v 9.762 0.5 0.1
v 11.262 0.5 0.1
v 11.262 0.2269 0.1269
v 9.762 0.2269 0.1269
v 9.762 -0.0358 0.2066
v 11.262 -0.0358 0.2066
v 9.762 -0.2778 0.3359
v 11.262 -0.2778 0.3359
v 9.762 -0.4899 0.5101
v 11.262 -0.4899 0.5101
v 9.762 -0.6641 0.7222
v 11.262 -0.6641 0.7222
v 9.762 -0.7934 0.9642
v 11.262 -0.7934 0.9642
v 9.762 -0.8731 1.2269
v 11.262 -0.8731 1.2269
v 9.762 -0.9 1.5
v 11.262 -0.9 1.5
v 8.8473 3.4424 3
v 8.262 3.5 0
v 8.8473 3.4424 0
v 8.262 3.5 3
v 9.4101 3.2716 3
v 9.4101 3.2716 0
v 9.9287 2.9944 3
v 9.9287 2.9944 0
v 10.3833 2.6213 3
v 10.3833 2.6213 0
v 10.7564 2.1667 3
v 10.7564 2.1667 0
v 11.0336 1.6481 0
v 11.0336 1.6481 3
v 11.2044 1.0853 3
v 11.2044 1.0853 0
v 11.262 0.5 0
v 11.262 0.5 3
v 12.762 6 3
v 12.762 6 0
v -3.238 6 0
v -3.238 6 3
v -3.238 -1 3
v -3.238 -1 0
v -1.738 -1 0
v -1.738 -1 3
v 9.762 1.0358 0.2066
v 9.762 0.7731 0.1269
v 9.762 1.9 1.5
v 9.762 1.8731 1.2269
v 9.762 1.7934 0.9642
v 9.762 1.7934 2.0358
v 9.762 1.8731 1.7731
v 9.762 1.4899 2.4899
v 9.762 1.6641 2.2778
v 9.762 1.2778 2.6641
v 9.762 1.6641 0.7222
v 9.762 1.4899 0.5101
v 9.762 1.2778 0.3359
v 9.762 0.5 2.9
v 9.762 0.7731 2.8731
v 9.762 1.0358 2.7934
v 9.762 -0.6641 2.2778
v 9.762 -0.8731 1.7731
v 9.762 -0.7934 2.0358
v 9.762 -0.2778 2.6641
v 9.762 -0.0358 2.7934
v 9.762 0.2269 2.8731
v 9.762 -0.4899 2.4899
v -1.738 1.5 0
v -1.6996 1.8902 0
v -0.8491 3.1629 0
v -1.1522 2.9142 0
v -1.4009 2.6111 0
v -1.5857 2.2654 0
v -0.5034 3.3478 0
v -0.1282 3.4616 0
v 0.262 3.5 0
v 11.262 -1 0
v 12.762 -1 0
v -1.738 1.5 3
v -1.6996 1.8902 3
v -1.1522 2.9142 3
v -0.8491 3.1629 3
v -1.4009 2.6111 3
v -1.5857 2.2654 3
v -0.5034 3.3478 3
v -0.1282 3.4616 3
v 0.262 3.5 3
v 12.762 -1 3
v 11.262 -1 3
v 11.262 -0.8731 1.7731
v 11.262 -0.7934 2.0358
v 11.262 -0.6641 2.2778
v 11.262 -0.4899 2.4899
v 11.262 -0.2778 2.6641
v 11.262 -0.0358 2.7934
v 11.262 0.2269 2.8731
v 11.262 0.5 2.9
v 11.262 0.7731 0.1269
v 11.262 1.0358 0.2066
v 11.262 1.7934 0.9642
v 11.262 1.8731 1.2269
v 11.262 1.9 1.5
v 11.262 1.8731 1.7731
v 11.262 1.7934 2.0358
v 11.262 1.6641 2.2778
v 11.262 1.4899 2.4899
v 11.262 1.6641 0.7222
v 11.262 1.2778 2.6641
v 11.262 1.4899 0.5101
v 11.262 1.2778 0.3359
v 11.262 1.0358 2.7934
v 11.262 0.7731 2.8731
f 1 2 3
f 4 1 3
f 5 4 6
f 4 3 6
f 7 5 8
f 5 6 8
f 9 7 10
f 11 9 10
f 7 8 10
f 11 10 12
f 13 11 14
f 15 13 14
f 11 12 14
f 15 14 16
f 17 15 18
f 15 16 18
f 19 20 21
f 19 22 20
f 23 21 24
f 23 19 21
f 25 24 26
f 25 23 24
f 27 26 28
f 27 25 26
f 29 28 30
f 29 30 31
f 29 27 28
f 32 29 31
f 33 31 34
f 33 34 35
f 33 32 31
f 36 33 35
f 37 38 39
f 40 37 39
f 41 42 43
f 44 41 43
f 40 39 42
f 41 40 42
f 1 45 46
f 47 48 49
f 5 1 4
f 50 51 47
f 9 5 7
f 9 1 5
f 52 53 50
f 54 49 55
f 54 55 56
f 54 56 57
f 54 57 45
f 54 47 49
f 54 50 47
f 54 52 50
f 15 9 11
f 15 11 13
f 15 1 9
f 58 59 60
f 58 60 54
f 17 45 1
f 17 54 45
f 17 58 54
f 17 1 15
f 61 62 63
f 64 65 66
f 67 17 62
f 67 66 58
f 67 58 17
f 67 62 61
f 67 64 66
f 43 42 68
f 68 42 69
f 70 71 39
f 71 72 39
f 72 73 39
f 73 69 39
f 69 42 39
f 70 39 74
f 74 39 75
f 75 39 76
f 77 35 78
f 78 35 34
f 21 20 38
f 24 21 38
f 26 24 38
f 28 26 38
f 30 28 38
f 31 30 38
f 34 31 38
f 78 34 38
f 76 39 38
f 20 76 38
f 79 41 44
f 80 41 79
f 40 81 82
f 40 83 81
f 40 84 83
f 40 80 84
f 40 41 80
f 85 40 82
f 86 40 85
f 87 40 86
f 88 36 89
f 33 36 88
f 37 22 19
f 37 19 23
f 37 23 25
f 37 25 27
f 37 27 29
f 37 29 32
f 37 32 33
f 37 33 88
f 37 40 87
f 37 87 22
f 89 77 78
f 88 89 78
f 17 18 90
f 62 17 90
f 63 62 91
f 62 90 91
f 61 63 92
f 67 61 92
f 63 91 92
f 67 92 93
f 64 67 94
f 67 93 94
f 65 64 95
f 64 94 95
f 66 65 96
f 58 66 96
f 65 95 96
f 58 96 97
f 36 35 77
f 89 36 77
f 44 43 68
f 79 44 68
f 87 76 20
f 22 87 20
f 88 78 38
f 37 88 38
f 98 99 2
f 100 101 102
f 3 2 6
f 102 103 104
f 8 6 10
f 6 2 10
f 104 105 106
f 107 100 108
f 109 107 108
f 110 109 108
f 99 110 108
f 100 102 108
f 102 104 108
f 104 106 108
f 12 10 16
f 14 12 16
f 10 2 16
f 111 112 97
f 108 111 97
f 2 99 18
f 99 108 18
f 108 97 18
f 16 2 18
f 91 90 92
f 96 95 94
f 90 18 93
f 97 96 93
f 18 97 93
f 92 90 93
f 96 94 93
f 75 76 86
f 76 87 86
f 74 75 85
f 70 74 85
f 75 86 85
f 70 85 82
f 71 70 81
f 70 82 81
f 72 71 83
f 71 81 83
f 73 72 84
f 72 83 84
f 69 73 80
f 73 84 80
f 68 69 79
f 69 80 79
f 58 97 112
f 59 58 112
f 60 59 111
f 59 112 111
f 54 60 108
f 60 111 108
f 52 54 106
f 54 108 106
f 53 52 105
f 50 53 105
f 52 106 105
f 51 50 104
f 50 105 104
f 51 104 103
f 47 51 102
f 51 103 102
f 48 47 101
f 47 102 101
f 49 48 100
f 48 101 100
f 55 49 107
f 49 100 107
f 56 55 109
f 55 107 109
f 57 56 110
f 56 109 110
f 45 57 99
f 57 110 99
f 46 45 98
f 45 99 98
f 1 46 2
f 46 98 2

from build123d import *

# Parameters (mm, degrees)
F1_DEPTH = 3
F2_R     = 3
F3_R     = 2
F5_DEPTH = 1.5


with BuildPart() as f1:
    # F0 (on Top) → F1 (new body)
    with BuildSketch(Plane.XY):
        Polygon((-3.2379887671, -1), (-1.7379887671, -1), (-1.7379887671, 3.5), (11.2620112329, 3.5), (11.2620112329, -1), (12.7620112329, -1), (12.7620112329, 6), (-3.2379887671, 6), align=None)
    extrude(amount=F1_DEPTH)

    # F2
    f2_edges = [f1.edges().sort_by_distance(p)[0] for p in [
        (11.262011, 3.5, 1.5),
    ]]
    fillet(f2_edges, radius=F2_R)

    # F3
    f3_edges = [f1.edges().sort_by_distance(p)[0] for p in [
        (-1.737989, 3.5, 1.5),
    ]]
    fillet(f3_edges, radius=F3_R)


with BuildPart() as f5:
    # F4 (on face) → F5 (new body)
    with BuildSketch(Plane(origin=(11.2620112329, 0, 0), x_dir=(0, -1, 0), z_dir=(-1, 0, 0))):
        with BuildLine():
            ThreePointArc((-0.5, 0.1), (0.4899494937, 0.5100505063), (0.9, 1.5))
            ThreePointArc((0.9, 1.5), (0.4899494937, 2.4899494937), (-0.5, 2.9))
            Line((-0.5, 2.9), (-0.5, 0.1))
        make_face()
        with BuildLine():
            Line((-0.5, 0.1), (-0.5, 2.9))
            ThreePointArc((-0.5, 2.9), (-1.9, 1.5), (-0.5, 0.1))
        make_face()
    extrude(amount=F5_DEPTH)


solid = Compound([f1.part, f5.part])
